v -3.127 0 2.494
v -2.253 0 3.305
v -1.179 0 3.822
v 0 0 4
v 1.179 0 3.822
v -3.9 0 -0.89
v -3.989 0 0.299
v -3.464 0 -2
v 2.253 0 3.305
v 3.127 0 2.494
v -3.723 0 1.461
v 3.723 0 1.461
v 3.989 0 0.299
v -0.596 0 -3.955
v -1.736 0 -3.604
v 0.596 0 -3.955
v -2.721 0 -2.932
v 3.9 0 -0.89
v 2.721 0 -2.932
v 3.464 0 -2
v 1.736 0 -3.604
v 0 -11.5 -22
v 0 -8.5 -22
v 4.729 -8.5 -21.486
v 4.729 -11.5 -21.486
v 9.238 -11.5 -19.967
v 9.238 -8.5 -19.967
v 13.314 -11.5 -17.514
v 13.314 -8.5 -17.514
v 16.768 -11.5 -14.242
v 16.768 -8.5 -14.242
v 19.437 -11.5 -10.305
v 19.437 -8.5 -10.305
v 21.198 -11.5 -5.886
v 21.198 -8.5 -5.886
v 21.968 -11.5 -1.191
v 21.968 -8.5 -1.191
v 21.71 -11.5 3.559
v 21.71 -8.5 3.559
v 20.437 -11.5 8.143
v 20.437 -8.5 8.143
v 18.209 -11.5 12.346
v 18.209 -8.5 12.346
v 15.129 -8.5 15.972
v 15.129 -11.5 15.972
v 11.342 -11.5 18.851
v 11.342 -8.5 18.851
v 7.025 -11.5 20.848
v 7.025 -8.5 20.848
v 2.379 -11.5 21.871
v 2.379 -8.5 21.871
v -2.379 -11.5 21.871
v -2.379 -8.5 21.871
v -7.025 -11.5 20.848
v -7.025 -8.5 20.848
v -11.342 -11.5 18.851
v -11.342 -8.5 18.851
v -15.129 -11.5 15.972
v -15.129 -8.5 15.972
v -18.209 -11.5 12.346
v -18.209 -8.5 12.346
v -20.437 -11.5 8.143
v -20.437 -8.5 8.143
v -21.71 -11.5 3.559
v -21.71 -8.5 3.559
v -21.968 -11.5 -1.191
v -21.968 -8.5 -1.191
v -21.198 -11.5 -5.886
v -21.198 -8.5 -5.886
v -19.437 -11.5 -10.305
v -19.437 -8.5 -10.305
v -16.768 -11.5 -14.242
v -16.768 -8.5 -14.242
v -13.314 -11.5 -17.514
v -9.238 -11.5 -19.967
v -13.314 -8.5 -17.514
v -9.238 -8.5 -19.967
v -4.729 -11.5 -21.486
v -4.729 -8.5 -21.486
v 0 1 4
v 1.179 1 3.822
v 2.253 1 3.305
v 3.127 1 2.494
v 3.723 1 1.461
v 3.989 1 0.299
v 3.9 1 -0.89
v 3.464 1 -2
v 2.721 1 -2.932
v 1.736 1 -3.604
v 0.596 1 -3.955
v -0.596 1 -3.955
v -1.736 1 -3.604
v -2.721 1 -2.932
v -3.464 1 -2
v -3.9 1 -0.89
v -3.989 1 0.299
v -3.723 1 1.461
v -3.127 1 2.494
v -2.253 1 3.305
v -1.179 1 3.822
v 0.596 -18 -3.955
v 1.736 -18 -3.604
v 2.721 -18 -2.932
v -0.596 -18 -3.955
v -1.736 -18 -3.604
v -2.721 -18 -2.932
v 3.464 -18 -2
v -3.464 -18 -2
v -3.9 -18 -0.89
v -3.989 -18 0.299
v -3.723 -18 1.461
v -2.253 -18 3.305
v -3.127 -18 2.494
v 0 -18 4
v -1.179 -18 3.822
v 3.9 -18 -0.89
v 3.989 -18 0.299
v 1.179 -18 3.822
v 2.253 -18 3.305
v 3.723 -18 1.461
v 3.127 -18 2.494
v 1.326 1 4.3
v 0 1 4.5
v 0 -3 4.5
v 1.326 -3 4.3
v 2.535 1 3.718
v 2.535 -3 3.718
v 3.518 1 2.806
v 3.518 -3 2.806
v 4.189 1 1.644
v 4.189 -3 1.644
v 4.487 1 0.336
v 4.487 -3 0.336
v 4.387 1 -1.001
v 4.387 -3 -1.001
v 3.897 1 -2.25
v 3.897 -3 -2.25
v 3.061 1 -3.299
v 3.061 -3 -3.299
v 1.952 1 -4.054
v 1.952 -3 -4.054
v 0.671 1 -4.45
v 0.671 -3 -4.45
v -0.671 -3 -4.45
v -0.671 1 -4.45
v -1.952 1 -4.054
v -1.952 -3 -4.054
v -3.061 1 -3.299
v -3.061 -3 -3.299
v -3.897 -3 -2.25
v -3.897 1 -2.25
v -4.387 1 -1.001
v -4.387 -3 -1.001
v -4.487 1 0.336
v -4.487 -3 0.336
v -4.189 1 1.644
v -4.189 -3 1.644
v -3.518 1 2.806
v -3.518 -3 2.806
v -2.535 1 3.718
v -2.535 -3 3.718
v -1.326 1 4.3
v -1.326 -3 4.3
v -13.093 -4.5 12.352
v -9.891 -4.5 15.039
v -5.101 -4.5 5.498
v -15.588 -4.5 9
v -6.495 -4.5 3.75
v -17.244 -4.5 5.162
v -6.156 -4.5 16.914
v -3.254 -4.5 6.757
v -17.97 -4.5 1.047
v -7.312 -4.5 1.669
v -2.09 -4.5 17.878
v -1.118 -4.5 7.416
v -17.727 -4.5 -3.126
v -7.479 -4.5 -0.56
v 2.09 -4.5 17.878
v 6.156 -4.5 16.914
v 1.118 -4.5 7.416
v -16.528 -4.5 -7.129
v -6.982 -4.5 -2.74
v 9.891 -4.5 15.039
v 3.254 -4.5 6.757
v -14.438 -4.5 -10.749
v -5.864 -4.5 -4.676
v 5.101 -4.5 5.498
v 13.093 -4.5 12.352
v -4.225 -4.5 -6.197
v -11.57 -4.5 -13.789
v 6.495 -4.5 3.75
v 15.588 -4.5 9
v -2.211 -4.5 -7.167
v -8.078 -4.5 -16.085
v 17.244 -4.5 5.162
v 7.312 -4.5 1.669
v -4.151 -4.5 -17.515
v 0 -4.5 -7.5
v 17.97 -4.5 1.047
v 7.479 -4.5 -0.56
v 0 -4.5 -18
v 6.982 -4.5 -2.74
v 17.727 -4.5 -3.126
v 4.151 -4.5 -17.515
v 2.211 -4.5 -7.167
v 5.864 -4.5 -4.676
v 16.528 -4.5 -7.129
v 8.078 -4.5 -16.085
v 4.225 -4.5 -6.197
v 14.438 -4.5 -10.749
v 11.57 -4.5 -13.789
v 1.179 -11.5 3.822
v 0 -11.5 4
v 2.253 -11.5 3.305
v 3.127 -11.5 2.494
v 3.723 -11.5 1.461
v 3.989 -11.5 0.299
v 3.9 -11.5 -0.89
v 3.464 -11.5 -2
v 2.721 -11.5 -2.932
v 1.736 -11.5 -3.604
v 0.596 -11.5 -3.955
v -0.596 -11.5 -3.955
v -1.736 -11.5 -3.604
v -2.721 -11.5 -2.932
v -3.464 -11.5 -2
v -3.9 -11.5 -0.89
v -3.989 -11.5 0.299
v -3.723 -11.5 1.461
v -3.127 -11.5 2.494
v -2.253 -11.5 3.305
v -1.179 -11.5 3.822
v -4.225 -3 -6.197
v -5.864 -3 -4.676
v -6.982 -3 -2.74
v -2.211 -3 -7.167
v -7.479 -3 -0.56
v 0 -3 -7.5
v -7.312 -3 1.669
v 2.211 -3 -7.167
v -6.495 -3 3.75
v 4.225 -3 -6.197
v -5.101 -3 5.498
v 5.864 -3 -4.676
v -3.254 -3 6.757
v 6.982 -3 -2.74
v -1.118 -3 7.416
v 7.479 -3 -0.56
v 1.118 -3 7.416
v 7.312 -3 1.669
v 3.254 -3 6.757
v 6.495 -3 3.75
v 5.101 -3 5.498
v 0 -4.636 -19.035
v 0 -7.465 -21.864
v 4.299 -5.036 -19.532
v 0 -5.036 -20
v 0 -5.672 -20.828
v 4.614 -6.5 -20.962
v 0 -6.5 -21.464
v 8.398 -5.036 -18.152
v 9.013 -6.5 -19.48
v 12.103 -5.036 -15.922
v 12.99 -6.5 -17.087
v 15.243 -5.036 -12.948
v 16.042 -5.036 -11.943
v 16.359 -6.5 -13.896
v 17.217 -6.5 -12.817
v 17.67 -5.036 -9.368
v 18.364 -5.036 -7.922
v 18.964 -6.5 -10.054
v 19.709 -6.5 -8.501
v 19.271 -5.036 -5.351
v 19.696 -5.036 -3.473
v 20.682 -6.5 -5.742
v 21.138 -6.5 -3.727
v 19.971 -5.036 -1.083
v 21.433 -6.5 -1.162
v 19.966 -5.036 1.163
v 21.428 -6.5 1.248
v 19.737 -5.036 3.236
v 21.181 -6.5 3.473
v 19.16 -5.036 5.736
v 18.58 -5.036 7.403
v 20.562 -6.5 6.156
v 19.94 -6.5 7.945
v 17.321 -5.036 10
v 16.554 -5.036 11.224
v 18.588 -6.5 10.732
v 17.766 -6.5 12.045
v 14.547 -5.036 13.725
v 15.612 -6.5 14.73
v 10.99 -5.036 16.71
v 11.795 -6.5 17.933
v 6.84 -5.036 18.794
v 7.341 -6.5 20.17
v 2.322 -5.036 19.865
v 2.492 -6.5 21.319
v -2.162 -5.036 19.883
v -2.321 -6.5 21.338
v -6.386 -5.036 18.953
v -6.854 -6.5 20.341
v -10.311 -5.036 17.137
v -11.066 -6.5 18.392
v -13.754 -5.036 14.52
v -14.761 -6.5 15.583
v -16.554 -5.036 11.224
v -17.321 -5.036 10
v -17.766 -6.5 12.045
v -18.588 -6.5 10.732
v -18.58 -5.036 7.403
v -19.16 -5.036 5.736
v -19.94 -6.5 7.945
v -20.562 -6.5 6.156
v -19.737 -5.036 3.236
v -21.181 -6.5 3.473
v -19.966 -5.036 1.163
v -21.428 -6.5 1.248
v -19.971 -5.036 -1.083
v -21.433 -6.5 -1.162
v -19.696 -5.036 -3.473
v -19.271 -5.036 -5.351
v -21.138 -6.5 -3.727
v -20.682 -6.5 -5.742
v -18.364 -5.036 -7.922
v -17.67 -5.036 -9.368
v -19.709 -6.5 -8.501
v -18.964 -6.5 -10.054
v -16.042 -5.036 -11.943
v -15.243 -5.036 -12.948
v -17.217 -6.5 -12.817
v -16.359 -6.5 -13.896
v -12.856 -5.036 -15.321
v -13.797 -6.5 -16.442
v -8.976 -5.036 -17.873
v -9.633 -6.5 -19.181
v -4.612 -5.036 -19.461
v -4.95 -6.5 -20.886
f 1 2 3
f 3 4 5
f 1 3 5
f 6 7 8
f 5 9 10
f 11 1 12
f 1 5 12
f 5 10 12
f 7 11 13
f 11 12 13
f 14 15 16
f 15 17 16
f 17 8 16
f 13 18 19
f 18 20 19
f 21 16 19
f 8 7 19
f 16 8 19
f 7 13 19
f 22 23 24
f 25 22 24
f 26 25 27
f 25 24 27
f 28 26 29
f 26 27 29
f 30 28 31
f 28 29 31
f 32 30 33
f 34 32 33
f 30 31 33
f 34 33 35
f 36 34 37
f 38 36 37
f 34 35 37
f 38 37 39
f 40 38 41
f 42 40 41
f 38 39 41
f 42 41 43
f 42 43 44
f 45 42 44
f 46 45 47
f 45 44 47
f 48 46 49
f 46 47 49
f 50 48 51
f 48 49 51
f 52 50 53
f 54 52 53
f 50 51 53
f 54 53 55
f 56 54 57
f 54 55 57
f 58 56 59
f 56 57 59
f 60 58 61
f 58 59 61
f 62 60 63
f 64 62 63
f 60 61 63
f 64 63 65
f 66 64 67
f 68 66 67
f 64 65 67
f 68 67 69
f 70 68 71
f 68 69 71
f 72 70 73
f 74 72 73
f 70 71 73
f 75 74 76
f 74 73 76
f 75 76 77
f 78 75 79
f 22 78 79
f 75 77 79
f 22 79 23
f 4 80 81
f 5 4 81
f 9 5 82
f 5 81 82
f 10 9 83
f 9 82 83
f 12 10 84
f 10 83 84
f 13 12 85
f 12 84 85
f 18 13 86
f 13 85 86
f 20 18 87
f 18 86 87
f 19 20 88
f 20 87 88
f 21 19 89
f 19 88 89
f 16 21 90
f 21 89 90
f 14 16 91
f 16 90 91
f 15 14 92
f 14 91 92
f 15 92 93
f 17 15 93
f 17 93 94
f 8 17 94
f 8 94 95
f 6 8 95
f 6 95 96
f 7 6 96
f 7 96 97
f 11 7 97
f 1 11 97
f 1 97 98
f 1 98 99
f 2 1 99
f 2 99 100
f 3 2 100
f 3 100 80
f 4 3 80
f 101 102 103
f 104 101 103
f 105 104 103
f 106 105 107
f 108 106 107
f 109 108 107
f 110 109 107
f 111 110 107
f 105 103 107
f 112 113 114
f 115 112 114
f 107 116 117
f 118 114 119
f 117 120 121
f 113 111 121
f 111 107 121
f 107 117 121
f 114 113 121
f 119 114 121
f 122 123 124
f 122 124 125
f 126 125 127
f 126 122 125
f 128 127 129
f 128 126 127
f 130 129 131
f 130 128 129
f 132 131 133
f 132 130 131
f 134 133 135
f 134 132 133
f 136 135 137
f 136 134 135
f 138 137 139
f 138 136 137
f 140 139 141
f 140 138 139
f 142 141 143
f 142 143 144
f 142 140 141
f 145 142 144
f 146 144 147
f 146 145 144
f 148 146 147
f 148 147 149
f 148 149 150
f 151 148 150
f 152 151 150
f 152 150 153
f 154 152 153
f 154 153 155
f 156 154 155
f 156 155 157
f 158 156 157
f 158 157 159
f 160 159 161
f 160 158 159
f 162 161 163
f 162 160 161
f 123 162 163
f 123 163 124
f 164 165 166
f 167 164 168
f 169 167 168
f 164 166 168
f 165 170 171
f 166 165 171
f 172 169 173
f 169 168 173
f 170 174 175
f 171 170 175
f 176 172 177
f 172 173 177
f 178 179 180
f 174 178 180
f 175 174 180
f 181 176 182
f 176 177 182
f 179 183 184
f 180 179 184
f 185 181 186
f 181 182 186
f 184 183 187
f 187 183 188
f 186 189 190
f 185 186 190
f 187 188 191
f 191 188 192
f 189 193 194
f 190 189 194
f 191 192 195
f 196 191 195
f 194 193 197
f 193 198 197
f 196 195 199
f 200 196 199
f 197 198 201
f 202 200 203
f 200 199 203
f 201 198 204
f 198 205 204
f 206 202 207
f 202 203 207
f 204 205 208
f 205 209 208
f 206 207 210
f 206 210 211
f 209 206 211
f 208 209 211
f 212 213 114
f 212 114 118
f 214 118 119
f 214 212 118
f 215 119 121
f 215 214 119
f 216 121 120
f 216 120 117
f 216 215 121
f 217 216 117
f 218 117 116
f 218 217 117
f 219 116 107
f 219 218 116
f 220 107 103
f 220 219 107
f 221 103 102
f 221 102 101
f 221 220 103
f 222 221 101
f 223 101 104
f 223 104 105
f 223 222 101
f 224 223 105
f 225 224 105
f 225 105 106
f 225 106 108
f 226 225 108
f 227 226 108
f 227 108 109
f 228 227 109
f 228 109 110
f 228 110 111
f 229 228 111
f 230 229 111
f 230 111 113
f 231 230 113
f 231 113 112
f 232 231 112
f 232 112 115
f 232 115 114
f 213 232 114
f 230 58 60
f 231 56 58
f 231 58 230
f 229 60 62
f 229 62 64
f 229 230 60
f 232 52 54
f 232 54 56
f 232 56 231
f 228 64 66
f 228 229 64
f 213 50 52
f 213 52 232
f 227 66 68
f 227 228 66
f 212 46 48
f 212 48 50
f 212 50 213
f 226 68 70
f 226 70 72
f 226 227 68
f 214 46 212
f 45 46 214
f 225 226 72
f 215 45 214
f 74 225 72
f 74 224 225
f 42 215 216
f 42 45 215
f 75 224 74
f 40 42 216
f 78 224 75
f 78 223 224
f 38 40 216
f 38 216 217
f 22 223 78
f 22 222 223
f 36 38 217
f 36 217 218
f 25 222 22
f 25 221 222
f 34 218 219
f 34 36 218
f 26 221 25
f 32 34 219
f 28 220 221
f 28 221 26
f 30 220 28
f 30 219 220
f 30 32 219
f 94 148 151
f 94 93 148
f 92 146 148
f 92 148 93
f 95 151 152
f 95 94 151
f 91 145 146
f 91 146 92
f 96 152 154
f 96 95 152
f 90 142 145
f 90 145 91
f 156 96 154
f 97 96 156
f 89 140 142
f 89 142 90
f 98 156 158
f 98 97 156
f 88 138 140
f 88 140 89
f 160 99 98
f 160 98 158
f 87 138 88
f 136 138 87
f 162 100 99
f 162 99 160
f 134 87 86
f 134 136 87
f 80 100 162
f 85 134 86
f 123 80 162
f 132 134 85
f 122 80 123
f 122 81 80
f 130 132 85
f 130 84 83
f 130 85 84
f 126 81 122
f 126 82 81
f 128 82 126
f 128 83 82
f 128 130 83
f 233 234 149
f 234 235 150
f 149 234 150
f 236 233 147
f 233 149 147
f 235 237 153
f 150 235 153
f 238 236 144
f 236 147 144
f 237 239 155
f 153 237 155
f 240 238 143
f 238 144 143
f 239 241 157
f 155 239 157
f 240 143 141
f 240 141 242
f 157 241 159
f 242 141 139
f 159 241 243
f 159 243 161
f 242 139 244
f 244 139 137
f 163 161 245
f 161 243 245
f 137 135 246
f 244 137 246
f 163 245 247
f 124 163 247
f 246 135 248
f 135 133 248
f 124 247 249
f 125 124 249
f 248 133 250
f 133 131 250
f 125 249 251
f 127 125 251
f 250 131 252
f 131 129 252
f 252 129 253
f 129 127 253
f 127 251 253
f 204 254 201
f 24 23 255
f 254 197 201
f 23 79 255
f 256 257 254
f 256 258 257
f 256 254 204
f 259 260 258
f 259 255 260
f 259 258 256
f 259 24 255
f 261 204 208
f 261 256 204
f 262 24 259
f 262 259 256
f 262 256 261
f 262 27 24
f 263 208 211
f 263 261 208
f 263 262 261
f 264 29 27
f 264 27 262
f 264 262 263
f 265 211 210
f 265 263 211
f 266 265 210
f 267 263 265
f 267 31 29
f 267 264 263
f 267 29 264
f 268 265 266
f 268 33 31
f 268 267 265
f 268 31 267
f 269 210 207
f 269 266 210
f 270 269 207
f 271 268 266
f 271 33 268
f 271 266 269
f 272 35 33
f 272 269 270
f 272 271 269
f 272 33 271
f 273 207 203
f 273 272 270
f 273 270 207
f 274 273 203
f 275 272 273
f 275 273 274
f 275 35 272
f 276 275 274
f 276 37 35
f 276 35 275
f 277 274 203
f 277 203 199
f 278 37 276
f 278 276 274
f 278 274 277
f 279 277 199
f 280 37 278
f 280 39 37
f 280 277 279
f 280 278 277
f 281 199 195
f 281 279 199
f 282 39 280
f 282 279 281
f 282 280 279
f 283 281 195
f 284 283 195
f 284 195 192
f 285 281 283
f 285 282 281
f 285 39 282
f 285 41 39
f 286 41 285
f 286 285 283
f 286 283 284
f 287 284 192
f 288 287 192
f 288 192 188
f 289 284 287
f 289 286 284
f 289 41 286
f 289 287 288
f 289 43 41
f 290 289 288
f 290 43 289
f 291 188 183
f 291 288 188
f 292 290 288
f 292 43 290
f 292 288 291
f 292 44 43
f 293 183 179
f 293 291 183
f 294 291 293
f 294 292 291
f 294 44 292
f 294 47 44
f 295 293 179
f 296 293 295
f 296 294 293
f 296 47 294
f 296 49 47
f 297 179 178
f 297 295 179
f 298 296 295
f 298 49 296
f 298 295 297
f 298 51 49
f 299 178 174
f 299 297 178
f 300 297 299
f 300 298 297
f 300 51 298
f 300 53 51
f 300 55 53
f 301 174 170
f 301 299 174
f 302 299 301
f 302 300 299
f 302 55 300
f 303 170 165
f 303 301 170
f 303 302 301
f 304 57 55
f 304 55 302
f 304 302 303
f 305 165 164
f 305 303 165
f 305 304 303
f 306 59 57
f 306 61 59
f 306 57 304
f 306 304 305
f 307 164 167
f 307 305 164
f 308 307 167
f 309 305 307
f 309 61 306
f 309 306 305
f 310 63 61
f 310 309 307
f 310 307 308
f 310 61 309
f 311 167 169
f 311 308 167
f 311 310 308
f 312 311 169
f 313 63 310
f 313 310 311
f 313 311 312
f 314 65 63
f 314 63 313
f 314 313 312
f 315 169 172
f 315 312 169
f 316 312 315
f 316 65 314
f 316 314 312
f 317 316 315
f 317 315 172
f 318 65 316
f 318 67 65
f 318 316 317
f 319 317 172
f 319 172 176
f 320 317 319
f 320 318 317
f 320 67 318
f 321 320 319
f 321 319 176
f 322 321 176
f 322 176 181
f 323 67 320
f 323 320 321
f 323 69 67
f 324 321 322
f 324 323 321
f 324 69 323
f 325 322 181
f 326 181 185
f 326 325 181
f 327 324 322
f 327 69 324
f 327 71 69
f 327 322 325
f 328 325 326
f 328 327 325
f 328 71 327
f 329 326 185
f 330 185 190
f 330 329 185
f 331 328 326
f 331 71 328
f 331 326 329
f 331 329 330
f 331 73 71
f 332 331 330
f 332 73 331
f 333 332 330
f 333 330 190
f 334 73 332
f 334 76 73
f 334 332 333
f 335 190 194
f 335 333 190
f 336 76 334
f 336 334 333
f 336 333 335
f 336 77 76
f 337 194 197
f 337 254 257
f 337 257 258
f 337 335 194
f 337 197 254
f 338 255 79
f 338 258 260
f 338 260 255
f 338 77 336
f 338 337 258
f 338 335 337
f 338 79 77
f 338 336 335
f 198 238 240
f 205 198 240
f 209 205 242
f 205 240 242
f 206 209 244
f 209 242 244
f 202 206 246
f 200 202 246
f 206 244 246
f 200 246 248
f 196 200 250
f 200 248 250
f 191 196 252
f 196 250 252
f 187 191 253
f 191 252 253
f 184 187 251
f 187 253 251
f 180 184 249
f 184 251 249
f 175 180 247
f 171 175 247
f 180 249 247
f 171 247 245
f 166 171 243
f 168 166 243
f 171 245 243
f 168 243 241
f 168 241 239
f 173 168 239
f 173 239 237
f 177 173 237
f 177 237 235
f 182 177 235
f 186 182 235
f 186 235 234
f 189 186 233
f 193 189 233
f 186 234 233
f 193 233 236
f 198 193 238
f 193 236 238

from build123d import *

# Parameters (mm, degrees)
BOSS_EXTRUDE1_DEPTH = 1.5
CUT_EXTRUDE1_DEPTH  = 2
SKETCH3_R           = 4
CUT_EXTRUDE2_DEPTH  = 2
SKETCH4_R           = 20
CUT_EXTRUDE3_DEPTH  = 0.5
FILLET1_R           = 1
SKETCH5_R           = 22
BOSS_EXTRUDE2_DEPTH = 3
SKETCH7_R           = 7.5
BOSS_EXTRUDE4_DEPTH = 1.5
SKETCH8_R           = 22
BOSS_EXTRUDE5_DEPTH = 7
SKETCH9_R           = 8
SKETCH9_R_2         = 6.5
CUT_EXTRUDE4_DEPTH  = 3
FILLET4_R           = 3
SKETCH10_R          = 46.144445172
SKETCH10_R_2        = 20.866025404
CUT_EXTRUDE5_DEPTH  = 6
CUT_EXTRUDE6_START  = -10
SKETCH12_R          = 20.866025404
SKETCH12_R_2        = 6.5
CUT_EXTRUDE6_DEPTH  = 10
FILLET5_R           = 4
SKETCH13_R          = 8.896552767
SKETCH13_R_2        = 4.5
CUT_EXTRUDE7_DEPTH  = 4
SKETCH14_R          = 4
BOSS_EXTRUDE7_DEPTH = 18


# Some blends are built 0.0001 mm under size
with BuildPart() as part:
    # Sketch1 → Boss-Extrude1 (new body)
    with BuildSketch(Plane(origin=(0, 0, 0), x_dir=(1, 0, 0), z_dir=(0, 1, 0))):
        with BuildLine():
            Line((-20.5, -35), (20.5, -35))
            ThreePointArc((20.5, -35), (24.035533906, -33.535533906), (25.5, -30))
            Line((25.5, -30), (25.5, 30))
            ThreePointArc((25.5, 30), (24.035533906, 33.535533906), (20.5, 35))
            Line((20.5, 35), (-20.5, 35))
            ThreePointArc((-20.5, 35), (-24.035533906, 33.535533906), (-25.5, 30))
            Line((-25.5, 30), (-25.5, -30))
            ThreePointArc((-25.5, -30), (-24.035533906, -33.535533906), (-20.5, -35))
        make_face()
    extrude(amount=BOSS_EXTRUDE1_DEPTH)

    # Sketch2 → Cut-Extrude1 (cut)
    with BuildSketch(Plane(origin=(0, 1.5, 0), x_dir=(1, 0, 0), z_dir=(0, 1, 0))):
        with BuildLine():
            Line((-21.5, 24.5), (-21.5, 28.5))
            ThreePointArc((-21.5, 28.5), (-17.5, 32.5), (-13.5, 28.5))
            Line((-13.5, 28.5), (-13.5, 24.5))
            ThreePointArc((-13.5, 24.5), (-17.5, 20.5), (-21.5, 24.5))
        make_face()
        with BuildLine():
            Line((13.5, 24.5), (13.5, 28.5))
            ThreePointArc((13.5, 28.5), (17.5, 32.5), (21.5, 28.5))
            Line((21.5, 28.5), (21.5, 24.5))
            ThreePointArc((21.5, 24.5), (17.5, 20.5), (13.5, 24.5))
        make_face()
    cut_extrude1 = extrude(amount=-CUT_EXTRUDE1_DEPTH, mode=Mode.SUBTRACT)

    # Mirror1: Cut-Extrude1 across plane
    add(cut_extrude1.mirror(Plane.XY), mode=Mode.SUBTRACT)

    # Sketch3 → Cut-Extrude2 (cut)
    with BuildSketch(Plane(origin=(0, 1.5, 0), x_dir=(1, 0, 0), z_dir=(0, 1, 0))):
        with Locations(Location((0, 0, 0), (0, 0, 270))):
            Circle(SKETCH3_R)
    extrude(amount=-CUT_EXTRUDE2_DEPTH, mode=Mode.SUBTRACT)

    # Sketch4 → Cut-Extrude3 (cut)
    with BuildSketch(Plane(origin=(0, 1.5, 0), x_dir=(1, 0, 0), z_dir=(0, 1, 0))):
        with Locations(Location((0, 0, 0), (0, 0, 270))):
            Circle(SKETCH4_R)
    extrude(amount=-CUT_EXTRUDE3_DEPTH, mode=Mode.SUBTRACT)

    # Fillet1
    # the kernel refuses this fillet: 1 mm, written as the material it takes off along each edge
    with BuildSketch(Plane(origin=(0, 1.5, 0), x_dir=(0, 0, 1), z_dir=(-1, 0, 0))) as fillet1_piece_1:
        with BuildLine():
            CenterArc((20.866025404, -1), FILLET1_R, 90, 60)
            Line((20, -0.5), (19.982679492, -0.49))
            ThreePointArc((19.982679492, -0.49), (19.98, -0.25), (19.98, 0))
            Line((19.98, 0), (20, 0.02))
            Line((20, 0.02), (20.866025404, 0.02))
            Line((20.866025404, 0.02), (20.866025404, 0))
        make_face()
    revolve(axis=Axis((0, 1.5, 0), (0, 1, 0)), mode=Mode.SUBTRACT)

    # Sketch5 → Boss-Extrude2 (add)
    with BuildSketch(Plane.XZ):
        with Locations(Location((0, 0, 0), (0, 0, 270))):
            Circle(SKETCH5_R)
    extrude(amount=BOSS_EXTRUDE2_DEPTH)

    # Sketch7 → Boss-Extrude4 (add)
    with BuildSketch(Plane.XZ.offset(3)):
        with Locations(Location((0, 0, 0), (0, 0, 270))):
            Circle(SKETCH7_R)
    extrude(amount=BOSS_EXTRUDE4_DEPTH)

    # Sketch8 → Boss-Extrude5 (add)
    with BuildSketch(Plane.XZ.offset(4.5)):
        with Locations(Location((0, 0, 0), (0, 0, 270))):
            Circle(SKETCH8_R)
    extrude(amount=BOSS_EXTRUDE5_DEPTH)

    # Sketch9 → Cut-Extrude4 (cut)
    with BuildSketch(Plane(origin=(0, 1, 0), x_dir=(1, 0, 0), z_dir=(0, 1, 0))):
        with Locations(Location((0, 0, 0), (0, 0, 270))):
            Circle(SKETCH9_R)
        with Locations(Location((0, 0, 0), (0, 0, 270))):
            Circle(SKETCH9_R_2, mode=Mode.SUBTRACT)
    extrude(amount=-CUT_EXTRUDE4_DEPTH, mode=Mode.SUBTRACT)

    # Fillet4
    fillet4_edges = [part.edges().sort_by_distance(p)[0] for p in [
        (0, 1, -8),
    ]]
    fillet(fillet4_edges, radius=FILLET4_R - 0.0001)  # a hair under: the kernel refuses the full size

    # Sketch10 → Cut-Extrude5 (cut)
    with BuildSketch(Plane(origin=(0, 1.5, 0), x_dir=(1, 0, 0), z_dir=(0, 1, 0))):
        Circle(SKETCH10_R)
        with Locations(Location((0, 0, 0), (0, 0, 270))):
            Circle(SKETCH10_R_2, mode=Mode.SUBTRACT)
    extrude(amount=-CUT_EXTRUDE5_DEPTH, mode=Mode.SUBTRACT)

    # Sketch12 → Cut-Extrude6 (cut)
    with BuildSketch(Plane.XZ.offset(3).offset(CUT_EXTRUDE6_START)):
        Circle(SKETCH12_R)
        with Locations(Location((0, 0, 0), (0, 0, 90))):
            Circle(SKETCH12_R_2, mode=Mode.SUBTRACT)
    extrude(amount=CUT_EXTRUDE6_DEPTH, mode=Mode.SUBTRACT)

    # Fillet5
    fillet5_edges = [part.edges().sort_by_distance(p)[0] for p in [
        (0, -4.5, 22),
    ]]
    fillet(fillet5_edges, radius=FILLET5_R)

    # Sketch13 → Cut-Extrude7 (cut)
    with BuildSketch(Plane(origin=(0, 1, 0), x_dir=(1, 0, 0), z_dir=(0, 1, 0))):
        Circle(SKETCH13_R)
        with Locations(Location((0, 0, 0), (0, 0, 270))):
            Circle(SKETCH13_R_2, mode=Mode.SUBTRACT)
    extrude(amount=-CUT_EXTRUDE7_DEPTH, mode=Mode.SUBTRACT)

    # Sketch14 → Boss-Extrude7 (add)
    with BuildSketch(Plane(origin=(0, 0, 0), x_dir=(1, 0, 0), z_dir=(0, 1, 0))):
        with Locations(Location((0, 0, 0), (0, 0, 270))):
            Circle(SKETCH14_R)
    extrude(amount=-BOSS_EXTRUDE7_DEPTH)


solid = part.part
